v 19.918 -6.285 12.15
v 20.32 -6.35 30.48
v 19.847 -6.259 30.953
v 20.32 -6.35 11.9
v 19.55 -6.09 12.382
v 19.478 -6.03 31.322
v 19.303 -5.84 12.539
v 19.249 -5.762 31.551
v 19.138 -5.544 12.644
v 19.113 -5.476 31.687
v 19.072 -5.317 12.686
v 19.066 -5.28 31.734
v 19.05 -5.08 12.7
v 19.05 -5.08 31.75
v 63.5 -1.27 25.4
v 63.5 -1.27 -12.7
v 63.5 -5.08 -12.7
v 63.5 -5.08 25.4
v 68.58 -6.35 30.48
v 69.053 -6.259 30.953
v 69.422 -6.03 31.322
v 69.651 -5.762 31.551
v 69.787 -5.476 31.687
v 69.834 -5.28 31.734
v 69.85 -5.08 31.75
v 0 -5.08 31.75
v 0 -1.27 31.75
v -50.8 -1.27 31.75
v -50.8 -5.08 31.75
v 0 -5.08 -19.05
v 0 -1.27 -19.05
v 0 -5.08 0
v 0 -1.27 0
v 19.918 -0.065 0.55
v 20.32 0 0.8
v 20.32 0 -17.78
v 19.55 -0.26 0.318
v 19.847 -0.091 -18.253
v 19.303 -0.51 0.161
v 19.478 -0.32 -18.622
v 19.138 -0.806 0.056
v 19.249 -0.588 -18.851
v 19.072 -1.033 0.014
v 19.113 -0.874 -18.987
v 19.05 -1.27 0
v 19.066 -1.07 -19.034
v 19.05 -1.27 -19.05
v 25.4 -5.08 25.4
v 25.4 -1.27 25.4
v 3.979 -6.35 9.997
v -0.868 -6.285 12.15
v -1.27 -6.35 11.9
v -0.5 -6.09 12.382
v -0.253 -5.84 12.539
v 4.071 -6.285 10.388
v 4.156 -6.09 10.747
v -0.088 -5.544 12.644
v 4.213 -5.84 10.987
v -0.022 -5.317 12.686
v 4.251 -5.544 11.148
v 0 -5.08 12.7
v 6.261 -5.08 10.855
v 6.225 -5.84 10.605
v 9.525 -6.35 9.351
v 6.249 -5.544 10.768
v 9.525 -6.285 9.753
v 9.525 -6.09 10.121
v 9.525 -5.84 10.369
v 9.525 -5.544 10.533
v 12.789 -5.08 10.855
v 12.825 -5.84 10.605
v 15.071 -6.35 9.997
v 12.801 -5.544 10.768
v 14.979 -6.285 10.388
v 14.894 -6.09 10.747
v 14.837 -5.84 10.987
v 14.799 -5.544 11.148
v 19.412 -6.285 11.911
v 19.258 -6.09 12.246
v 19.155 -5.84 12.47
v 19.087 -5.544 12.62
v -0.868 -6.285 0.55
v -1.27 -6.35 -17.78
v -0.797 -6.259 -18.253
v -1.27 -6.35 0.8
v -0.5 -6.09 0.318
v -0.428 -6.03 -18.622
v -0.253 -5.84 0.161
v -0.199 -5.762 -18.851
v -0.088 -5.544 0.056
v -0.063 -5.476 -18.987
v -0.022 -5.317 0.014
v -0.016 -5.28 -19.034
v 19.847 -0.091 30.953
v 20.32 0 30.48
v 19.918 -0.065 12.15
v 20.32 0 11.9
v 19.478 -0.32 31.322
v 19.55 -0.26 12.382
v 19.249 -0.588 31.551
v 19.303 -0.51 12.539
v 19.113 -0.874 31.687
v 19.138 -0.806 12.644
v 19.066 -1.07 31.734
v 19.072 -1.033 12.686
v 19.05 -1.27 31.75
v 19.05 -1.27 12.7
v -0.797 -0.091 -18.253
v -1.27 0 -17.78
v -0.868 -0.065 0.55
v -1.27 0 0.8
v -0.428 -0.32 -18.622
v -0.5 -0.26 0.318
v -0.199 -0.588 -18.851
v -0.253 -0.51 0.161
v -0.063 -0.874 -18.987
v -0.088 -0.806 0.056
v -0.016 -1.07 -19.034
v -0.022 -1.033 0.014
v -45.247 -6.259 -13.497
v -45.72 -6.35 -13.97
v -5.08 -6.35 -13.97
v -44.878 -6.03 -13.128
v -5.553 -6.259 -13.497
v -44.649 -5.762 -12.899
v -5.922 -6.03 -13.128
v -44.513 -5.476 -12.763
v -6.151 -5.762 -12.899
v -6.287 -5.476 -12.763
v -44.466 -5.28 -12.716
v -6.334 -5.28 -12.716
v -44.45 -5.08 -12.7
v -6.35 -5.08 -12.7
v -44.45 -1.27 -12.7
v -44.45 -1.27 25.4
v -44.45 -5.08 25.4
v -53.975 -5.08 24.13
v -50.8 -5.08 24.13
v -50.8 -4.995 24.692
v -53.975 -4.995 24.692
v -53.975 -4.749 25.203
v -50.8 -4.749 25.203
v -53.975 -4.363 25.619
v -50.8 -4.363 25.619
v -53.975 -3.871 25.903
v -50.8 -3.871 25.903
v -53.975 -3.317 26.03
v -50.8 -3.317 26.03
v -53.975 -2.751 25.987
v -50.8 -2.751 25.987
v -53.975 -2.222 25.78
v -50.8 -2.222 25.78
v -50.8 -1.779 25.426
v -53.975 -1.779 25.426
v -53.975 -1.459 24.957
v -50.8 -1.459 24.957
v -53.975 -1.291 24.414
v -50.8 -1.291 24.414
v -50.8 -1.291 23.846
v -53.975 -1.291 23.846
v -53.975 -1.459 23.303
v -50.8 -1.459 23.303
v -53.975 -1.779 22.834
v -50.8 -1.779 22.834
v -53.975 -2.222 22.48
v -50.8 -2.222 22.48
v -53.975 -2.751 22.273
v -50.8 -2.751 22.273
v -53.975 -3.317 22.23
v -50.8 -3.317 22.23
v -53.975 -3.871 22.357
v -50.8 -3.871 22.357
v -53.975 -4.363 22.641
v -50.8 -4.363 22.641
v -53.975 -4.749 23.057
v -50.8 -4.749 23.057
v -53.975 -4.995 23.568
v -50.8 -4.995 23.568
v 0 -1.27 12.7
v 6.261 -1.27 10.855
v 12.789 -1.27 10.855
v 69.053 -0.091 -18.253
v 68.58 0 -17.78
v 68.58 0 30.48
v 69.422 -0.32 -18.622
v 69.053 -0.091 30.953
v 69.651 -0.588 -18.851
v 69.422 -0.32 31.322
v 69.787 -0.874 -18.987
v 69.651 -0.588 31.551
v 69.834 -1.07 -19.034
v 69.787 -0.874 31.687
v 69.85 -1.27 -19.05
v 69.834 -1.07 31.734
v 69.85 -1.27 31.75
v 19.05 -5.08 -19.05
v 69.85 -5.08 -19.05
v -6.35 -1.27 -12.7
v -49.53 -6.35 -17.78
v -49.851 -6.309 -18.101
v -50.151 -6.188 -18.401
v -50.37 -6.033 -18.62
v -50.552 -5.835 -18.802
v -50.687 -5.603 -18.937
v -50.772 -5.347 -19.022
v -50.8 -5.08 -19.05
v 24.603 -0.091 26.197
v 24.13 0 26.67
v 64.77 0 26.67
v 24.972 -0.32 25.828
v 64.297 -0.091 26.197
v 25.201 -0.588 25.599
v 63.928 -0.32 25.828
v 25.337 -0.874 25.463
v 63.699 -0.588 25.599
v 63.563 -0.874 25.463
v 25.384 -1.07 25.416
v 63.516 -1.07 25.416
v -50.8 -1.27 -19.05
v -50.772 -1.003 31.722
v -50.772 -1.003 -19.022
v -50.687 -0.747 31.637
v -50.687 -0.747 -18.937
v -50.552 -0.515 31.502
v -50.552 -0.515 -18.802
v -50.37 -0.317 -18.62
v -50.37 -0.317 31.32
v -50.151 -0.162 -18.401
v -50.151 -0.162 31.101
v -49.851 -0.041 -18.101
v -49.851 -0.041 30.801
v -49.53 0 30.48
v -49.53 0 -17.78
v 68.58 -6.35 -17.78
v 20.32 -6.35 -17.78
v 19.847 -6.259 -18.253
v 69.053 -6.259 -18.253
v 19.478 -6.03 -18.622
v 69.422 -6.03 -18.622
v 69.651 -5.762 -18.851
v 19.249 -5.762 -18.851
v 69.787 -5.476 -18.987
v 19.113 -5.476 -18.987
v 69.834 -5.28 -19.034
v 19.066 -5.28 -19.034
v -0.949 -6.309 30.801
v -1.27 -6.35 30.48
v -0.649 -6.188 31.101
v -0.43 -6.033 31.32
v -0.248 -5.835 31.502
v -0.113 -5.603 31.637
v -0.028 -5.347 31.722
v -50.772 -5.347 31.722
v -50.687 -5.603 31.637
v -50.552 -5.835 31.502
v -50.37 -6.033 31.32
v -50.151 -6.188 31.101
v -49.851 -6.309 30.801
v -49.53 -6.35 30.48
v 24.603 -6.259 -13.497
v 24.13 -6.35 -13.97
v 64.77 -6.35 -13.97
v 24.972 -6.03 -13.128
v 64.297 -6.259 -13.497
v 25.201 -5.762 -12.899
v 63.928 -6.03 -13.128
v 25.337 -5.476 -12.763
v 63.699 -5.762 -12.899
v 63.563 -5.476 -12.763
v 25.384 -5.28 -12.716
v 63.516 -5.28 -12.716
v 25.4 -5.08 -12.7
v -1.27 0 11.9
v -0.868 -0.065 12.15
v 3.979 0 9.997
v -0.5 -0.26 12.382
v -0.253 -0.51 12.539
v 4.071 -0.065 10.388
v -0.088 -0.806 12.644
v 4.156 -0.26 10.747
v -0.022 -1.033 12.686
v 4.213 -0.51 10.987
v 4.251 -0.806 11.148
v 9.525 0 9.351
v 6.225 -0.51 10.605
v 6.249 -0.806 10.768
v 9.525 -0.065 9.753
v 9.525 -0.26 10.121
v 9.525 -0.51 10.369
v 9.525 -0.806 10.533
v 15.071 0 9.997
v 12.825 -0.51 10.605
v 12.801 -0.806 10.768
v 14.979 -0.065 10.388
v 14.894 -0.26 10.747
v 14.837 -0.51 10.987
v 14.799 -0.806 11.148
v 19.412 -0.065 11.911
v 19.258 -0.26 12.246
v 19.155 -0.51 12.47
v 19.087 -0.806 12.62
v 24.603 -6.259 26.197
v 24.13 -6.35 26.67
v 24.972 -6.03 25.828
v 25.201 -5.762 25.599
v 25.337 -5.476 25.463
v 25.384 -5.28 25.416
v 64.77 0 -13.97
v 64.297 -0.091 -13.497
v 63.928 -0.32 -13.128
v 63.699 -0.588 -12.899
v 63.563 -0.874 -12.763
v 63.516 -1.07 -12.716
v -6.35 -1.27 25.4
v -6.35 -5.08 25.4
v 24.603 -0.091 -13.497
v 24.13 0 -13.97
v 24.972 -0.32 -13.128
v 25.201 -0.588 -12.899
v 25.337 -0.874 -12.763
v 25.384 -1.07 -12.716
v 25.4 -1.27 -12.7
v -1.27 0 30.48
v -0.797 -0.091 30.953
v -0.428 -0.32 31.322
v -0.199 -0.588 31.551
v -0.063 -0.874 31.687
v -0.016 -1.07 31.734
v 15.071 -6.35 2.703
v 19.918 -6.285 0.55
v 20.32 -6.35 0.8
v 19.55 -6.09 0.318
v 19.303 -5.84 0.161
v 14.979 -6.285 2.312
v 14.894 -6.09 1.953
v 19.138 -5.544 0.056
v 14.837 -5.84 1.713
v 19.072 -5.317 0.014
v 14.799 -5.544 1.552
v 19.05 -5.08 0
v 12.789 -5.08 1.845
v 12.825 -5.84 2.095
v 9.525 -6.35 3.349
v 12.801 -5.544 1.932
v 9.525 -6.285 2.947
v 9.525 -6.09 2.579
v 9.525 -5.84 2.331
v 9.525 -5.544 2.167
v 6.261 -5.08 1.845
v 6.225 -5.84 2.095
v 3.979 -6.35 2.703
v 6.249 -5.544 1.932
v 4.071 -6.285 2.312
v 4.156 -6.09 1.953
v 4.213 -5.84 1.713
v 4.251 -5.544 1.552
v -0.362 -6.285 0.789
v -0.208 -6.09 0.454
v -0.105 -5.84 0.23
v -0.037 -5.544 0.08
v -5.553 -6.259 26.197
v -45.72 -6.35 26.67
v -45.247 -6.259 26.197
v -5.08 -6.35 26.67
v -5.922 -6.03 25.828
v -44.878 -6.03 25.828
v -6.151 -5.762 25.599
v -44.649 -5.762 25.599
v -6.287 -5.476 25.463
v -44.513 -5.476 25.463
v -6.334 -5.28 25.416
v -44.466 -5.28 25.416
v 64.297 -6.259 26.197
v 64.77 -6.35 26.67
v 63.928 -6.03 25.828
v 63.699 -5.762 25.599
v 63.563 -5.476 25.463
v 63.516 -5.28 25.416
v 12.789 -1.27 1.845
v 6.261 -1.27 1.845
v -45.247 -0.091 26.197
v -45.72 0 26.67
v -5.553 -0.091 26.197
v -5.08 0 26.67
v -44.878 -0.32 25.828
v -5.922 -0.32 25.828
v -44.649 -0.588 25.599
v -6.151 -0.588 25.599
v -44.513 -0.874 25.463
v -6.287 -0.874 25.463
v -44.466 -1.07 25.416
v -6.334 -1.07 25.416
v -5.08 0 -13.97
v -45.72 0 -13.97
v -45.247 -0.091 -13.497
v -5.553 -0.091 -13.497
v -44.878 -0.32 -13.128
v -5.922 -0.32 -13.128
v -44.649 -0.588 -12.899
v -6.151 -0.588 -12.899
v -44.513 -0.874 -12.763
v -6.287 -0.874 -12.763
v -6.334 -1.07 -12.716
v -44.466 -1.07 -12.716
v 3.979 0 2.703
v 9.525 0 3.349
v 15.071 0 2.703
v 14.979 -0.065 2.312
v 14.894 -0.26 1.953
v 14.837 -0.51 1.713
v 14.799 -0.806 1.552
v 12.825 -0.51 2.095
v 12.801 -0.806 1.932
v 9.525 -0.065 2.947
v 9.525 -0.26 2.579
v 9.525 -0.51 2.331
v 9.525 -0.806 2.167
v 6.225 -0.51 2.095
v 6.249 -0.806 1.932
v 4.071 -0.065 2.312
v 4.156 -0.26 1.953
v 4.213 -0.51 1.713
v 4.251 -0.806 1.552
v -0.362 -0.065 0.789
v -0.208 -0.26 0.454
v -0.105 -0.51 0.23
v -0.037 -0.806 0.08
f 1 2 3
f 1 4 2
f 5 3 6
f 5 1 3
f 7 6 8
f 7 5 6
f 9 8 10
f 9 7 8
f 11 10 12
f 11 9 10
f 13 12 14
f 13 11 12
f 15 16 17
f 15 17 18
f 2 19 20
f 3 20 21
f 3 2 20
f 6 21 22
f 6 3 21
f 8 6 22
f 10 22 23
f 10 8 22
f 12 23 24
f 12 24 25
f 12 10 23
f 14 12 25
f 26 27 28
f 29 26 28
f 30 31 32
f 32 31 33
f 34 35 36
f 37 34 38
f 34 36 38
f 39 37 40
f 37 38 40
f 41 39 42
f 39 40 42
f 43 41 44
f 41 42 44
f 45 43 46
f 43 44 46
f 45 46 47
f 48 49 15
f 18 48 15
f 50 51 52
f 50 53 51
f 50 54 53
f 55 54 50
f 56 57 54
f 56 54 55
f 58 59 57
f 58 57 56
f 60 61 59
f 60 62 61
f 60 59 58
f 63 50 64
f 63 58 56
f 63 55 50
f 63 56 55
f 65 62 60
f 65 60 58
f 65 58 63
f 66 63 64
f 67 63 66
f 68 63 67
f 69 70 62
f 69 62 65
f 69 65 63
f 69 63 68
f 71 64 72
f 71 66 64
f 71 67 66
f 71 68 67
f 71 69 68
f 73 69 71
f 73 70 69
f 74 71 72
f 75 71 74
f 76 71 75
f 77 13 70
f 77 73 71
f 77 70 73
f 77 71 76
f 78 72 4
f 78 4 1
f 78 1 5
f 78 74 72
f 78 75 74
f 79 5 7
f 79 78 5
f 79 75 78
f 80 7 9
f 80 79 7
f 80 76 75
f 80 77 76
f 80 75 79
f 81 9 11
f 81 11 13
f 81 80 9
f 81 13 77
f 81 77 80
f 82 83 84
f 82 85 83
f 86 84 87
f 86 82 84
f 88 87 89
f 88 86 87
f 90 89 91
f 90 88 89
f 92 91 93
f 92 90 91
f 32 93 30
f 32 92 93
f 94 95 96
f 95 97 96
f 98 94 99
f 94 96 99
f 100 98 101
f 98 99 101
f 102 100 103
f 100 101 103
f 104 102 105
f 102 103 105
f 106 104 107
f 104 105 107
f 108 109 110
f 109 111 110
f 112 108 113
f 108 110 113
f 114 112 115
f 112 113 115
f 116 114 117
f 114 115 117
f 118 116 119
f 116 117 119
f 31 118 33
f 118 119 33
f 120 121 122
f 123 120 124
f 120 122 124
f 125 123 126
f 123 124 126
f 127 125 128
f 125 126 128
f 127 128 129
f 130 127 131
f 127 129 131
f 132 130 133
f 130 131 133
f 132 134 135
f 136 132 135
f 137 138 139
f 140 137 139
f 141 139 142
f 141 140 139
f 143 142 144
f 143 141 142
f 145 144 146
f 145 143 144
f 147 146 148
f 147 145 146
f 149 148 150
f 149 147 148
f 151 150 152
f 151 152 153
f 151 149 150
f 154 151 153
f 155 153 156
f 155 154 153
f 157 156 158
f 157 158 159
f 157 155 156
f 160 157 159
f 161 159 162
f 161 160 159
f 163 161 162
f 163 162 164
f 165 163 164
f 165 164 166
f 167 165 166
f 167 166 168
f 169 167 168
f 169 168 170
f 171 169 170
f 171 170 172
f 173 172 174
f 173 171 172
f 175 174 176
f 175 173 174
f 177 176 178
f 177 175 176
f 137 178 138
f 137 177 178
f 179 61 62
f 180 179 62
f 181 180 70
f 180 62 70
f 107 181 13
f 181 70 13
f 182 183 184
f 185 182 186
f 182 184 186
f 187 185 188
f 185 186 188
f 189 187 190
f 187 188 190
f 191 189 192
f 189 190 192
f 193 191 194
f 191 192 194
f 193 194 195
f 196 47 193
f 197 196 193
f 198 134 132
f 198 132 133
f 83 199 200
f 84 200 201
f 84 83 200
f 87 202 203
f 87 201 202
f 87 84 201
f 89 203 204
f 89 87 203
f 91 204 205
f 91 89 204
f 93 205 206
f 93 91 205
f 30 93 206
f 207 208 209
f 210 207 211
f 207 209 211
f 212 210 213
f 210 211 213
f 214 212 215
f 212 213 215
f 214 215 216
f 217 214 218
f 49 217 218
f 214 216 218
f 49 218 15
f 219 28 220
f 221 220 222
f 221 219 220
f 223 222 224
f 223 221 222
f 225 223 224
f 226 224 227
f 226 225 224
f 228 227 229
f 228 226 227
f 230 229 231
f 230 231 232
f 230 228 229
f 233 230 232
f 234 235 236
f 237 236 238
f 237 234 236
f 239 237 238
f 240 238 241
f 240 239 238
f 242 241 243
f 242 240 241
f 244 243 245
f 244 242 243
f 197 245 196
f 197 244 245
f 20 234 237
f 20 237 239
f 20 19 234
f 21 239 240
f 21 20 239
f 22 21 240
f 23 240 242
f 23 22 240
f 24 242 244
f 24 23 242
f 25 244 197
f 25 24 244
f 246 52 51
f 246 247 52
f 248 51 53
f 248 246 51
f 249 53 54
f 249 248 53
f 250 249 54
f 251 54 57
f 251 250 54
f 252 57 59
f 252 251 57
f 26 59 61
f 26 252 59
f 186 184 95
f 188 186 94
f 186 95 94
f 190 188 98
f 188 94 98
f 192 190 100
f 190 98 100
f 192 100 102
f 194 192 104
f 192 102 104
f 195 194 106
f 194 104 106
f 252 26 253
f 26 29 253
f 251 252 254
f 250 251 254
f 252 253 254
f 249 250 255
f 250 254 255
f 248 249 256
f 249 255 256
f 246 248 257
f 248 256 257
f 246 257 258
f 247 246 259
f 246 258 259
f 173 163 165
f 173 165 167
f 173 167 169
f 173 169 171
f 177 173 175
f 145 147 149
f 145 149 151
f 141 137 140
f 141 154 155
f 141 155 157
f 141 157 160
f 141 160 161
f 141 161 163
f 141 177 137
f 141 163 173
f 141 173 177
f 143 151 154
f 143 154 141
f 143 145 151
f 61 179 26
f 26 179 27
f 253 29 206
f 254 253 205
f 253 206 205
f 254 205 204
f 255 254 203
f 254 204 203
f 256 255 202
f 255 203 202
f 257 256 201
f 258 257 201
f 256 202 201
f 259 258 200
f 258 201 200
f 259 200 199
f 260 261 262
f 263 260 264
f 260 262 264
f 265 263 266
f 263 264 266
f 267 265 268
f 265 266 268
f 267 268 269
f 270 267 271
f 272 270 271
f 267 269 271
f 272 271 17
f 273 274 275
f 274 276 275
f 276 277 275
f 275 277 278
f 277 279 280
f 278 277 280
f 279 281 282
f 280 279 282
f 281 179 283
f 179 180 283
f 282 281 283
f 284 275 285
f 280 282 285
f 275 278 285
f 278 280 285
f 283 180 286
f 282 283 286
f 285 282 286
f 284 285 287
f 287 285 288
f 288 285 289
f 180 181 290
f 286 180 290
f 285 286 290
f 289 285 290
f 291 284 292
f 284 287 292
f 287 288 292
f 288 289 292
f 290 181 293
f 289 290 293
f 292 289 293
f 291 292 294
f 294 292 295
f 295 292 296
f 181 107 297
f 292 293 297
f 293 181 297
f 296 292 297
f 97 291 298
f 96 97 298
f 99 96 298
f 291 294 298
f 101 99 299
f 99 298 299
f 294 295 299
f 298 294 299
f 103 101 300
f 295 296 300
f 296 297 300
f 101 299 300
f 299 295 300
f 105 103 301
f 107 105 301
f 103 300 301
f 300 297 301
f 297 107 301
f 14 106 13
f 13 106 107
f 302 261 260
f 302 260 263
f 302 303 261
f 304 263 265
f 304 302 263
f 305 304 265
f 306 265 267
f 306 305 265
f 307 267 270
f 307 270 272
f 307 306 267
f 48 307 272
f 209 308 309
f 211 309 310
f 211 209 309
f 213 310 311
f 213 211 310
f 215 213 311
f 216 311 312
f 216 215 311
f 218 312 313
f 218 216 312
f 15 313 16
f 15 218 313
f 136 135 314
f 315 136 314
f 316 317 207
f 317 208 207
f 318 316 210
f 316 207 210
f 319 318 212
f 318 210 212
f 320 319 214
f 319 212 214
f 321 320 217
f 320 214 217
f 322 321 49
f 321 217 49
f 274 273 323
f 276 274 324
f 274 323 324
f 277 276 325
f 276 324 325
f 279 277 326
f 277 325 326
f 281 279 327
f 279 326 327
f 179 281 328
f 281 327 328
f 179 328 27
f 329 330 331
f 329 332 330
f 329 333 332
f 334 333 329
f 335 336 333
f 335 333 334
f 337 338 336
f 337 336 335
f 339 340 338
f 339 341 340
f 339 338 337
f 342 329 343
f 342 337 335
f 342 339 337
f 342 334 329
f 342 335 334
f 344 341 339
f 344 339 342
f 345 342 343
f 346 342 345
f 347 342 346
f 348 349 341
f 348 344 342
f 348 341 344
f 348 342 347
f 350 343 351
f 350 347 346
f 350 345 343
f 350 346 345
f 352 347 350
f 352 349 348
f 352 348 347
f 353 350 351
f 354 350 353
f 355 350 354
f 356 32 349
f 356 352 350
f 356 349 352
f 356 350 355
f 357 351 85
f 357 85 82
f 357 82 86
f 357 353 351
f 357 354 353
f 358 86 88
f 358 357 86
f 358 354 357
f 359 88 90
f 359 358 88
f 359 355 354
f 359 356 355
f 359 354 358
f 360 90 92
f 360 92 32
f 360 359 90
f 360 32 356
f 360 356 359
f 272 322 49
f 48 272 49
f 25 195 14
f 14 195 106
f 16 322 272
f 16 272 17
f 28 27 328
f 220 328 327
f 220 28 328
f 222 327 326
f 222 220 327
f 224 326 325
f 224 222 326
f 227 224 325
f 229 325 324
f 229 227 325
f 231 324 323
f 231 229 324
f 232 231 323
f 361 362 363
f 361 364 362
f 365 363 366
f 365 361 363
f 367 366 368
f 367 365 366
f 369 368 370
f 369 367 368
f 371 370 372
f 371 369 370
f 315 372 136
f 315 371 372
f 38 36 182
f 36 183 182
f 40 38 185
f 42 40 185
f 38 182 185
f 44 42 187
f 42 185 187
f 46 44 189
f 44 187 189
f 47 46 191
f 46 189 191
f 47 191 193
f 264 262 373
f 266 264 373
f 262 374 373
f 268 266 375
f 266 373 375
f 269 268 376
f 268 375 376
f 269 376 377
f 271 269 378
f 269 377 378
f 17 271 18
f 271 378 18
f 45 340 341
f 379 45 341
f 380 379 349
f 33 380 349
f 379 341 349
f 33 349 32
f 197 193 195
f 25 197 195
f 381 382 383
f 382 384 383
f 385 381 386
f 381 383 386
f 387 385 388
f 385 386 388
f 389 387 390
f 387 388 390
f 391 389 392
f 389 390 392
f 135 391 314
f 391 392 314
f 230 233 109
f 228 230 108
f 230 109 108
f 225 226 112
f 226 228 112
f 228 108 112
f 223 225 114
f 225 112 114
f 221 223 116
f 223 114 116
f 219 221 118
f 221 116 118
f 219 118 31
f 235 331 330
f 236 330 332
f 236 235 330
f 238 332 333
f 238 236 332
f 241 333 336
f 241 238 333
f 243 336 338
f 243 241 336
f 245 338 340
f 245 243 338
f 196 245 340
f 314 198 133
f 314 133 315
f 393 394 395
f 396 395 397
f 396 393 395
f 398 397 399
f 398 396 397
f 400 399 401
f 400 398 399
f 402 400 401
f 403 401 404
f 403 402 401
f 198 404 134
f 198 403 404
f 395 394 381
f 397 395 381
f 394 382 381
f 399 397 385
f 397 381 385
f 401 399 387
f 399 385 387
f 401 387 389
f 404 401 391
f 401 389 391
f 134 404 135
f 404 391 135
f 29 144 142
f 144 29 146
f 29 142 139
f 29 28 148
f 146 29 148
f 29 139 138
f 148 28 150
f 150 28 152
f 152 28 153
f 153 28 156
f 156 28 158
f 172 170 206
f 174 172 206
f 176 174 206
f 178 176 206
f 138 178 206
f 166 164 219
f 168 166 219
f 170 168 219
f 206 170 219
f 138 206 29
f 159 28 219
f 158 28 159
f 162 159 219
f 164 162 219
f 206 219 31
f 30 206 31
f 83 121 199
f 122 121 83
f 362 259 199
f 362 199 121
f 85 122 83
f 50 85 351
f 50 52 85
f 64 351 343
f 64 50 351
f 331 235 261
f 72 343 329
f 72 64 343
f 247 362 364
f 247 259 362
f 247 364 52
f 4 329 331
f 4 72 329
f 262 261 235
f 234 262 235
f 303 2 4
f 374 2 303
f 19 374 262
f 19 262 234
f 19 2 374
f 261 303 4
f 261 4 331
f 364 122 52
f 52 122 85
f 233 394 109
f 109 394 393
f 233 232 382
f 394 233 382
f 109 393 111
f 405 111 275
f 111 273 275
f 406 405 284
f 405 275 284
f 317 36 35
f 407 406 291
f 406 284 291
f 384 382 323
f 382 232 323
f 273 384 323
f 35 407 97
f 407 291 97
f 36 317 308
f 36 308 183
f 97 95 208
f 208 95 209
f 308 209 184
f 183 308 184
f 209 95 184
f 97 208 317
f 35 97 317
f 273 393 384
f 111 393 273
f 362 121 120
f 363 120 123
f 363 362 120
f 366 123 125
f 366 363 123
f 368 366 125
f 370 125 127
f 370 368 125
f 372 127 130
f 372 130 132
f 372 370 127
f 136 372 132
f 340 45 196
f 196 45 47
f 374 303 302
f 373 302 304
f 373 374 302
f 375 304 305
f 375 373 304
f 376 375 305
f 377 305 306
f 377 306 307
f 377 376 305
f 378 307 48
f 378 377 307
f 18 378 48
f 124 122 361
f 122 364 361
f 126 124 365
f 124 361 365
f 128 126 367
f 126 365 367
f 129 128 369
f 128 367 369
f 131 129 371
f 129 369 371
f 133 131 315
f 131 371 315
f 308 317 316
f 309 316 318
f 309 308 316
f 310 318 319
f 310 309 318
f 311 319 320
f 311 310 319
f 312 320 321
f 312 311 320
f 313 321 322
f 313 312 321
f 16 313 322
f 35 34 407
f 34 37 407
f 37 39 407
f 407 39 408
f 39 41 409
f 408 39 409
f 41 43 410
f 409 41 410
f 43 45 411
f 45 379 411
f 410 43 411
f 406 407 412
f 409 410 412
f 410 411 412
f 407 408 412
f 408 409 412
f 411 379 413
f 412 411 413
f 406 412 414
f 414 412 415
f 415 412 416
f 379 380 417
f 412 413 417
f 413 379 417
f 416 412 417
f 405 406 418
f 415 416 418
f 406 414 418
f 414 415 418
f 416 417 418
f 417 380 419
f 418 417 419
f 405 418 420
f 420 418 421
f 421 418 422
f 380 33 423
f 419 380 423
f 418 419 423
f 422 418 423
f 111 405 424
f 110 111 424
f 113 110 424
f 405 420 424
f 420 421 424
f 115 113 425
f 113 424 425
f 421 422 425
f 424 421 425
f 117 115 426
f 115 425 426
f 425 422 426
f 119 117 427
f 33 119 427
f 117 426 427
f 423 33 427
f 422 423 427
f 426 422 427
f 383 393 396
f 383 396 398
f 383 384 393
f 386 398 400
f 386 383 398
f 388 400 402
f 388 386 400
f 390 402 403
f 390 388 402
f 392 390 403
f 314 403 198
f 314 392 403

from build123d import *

# Parameters (mm, degrees)
F0_W     = 38.1
F0_H     = 38.1
F1_DEPTH = 6.35
F4_DEPTH = 6.35
F5_DEPTH = 6.351
F2_R     = 1.905
F6_DEPTH = 3.175
F7_R     = 1.26999


# Not quite as in the source:
# - a fillet or chamfer is up to 0.001 mm smaller than in the source, because OpenCascade refuses the exact size
# - a feature names something its author has since deleted; it is built from what else it names


with BuildPart() as f1:
    # F0 (on Front) → F1 (new body)
    with BuildSketch(Plane.XZ):
        Polygon((0, 12.7), (0, 31.75), (-50.8, 31.75), (-50.8, -19.05), (0, -19.05), (0, 0), (19.05, 0), (19.05, -19.05), (69.85, -19.05), (69.85, 31.75), (19.05, 31.75), (19.05, 12.7), align=None)
        with Locations((-25.4, 6.35)):
            Rectangle(F0_W, F0_H, mode=Mode.SUBTRACT)
        with Locations((44.45, 6.35)):
            Rectangle(F0_W, F0_H, mode=Mode.SUBTRACT)
    extrude(amount=F1_DEPTH)

    # F3 (on face) → F4 (join)
    with BuildSketch(Plane.XZ.offset(6.35)):
        with BuildLine():
            Line((0, 0), (19.05, 0))
            ThreePointArc((19.05, 0), (9.525, 2.0789034216), (0, 0))
        make_face()
        with BuildLine():
            Line((19.05, 12.7), (0, 12.7))
            ThreePointArc((0, 12.7), (9.525, 10.6210965784), (19.05, 12.7))
        make_face()
    extrude(amount=-F4_DEPTH)

    # F3 (on face) → F5 (cut, through all)
    with BuildSketch(Plane.XZ.offset(6.35)):
        with BuildLine():
            Line((0, 0), (19.05, 0))
            ThreePointArc((19.05, 0), (9.525, 2.0789034216), (0, 0))
        make_face()
        with BuildLine():
            Line((19.05, 12.7), (0, 12.7))
            ThreePointArc((0, 12.7), (9.525, 10.6210965784), (19.05, 12.7))
        make_face()
    extrude(amount=-F5_DEPTH, mode=Mode.SUBTRACT)

    # F2 (on face) → F6 (join, symmetric)
    with BuildSketch(Plane(origin=(-50.8, 0, 0), x_dir=(0, -1, 0), z_dir=(-1, 0, 0))):
        with Locations((3.175, 24.13)):
            Circle(F2_R)
    extrude(amount=F6_DEPTH, both=True)

    # F7 (radius 1.27 in the source; OpenCascade refuses exactly that, so slightly less here)
    f7_edges = [f1.edges().sort_by_distance(p)[0] for p in [
        (-25.4, -6.35, 31.75),
        (-50.8, -6.35, 6.35),
        (-25.4, -6.35, -19.05),
        (0, -6.35, -9.525),
        (0, -6.35, 22.225),
        (19.05, -6.35, 22.225),
        (19.05, -6.35, -9.525),
        (44.45, -6.35, -19.05),
        (69.85, -6.35, 6.35),
        (44.45, -6.35, 31.75),
        (44.45, 0, 31.75),
        (19.05, 0, 22.225),
        (0, 0, 22.225),
        (-25.4, 0, 31.75),
        (-50.8, 0, 6.35),
        (-25.4, 0, -19.05),
        (0, 0, -9.525),
        (19.05, 0, -9.525),
        (44.45, 0, -19.05),
        (69.85, 0, 6.35),
        (9.525, -6.35, 10.621097),
        (9.525, 0, 10.621097),
        (9.525, 0, 2.078903),
        (9.525, -6.35, 2.078903),
        (25.4, -6.35, 6.35),
        (25.4, 0, 6.35),
        (44.45, -6.35, -12.7),
        (44.45, 0, -12.7),
        (63.5, -6.35, 6.35),
        (63.5, 0, 6.35),
        (44.45, 0, 25.4),
        (44.45, -6.35, 25.4),
        (-25.4, -6.35, 25.4),
        (-25.4, 0, 25.4),
        (-44.45, 0, 6.35),
        (-44.45, -6.35, 6.35),
        (-25.4, 0, -12.7),
        (-25.4, -6.35, -12.7),
        (-6.35, 0, 6.35),
        (-6.35, -6.35, 6.35),
    ]]
    fillet(f7_edges, radius=F7_R)


solid = f1.part
